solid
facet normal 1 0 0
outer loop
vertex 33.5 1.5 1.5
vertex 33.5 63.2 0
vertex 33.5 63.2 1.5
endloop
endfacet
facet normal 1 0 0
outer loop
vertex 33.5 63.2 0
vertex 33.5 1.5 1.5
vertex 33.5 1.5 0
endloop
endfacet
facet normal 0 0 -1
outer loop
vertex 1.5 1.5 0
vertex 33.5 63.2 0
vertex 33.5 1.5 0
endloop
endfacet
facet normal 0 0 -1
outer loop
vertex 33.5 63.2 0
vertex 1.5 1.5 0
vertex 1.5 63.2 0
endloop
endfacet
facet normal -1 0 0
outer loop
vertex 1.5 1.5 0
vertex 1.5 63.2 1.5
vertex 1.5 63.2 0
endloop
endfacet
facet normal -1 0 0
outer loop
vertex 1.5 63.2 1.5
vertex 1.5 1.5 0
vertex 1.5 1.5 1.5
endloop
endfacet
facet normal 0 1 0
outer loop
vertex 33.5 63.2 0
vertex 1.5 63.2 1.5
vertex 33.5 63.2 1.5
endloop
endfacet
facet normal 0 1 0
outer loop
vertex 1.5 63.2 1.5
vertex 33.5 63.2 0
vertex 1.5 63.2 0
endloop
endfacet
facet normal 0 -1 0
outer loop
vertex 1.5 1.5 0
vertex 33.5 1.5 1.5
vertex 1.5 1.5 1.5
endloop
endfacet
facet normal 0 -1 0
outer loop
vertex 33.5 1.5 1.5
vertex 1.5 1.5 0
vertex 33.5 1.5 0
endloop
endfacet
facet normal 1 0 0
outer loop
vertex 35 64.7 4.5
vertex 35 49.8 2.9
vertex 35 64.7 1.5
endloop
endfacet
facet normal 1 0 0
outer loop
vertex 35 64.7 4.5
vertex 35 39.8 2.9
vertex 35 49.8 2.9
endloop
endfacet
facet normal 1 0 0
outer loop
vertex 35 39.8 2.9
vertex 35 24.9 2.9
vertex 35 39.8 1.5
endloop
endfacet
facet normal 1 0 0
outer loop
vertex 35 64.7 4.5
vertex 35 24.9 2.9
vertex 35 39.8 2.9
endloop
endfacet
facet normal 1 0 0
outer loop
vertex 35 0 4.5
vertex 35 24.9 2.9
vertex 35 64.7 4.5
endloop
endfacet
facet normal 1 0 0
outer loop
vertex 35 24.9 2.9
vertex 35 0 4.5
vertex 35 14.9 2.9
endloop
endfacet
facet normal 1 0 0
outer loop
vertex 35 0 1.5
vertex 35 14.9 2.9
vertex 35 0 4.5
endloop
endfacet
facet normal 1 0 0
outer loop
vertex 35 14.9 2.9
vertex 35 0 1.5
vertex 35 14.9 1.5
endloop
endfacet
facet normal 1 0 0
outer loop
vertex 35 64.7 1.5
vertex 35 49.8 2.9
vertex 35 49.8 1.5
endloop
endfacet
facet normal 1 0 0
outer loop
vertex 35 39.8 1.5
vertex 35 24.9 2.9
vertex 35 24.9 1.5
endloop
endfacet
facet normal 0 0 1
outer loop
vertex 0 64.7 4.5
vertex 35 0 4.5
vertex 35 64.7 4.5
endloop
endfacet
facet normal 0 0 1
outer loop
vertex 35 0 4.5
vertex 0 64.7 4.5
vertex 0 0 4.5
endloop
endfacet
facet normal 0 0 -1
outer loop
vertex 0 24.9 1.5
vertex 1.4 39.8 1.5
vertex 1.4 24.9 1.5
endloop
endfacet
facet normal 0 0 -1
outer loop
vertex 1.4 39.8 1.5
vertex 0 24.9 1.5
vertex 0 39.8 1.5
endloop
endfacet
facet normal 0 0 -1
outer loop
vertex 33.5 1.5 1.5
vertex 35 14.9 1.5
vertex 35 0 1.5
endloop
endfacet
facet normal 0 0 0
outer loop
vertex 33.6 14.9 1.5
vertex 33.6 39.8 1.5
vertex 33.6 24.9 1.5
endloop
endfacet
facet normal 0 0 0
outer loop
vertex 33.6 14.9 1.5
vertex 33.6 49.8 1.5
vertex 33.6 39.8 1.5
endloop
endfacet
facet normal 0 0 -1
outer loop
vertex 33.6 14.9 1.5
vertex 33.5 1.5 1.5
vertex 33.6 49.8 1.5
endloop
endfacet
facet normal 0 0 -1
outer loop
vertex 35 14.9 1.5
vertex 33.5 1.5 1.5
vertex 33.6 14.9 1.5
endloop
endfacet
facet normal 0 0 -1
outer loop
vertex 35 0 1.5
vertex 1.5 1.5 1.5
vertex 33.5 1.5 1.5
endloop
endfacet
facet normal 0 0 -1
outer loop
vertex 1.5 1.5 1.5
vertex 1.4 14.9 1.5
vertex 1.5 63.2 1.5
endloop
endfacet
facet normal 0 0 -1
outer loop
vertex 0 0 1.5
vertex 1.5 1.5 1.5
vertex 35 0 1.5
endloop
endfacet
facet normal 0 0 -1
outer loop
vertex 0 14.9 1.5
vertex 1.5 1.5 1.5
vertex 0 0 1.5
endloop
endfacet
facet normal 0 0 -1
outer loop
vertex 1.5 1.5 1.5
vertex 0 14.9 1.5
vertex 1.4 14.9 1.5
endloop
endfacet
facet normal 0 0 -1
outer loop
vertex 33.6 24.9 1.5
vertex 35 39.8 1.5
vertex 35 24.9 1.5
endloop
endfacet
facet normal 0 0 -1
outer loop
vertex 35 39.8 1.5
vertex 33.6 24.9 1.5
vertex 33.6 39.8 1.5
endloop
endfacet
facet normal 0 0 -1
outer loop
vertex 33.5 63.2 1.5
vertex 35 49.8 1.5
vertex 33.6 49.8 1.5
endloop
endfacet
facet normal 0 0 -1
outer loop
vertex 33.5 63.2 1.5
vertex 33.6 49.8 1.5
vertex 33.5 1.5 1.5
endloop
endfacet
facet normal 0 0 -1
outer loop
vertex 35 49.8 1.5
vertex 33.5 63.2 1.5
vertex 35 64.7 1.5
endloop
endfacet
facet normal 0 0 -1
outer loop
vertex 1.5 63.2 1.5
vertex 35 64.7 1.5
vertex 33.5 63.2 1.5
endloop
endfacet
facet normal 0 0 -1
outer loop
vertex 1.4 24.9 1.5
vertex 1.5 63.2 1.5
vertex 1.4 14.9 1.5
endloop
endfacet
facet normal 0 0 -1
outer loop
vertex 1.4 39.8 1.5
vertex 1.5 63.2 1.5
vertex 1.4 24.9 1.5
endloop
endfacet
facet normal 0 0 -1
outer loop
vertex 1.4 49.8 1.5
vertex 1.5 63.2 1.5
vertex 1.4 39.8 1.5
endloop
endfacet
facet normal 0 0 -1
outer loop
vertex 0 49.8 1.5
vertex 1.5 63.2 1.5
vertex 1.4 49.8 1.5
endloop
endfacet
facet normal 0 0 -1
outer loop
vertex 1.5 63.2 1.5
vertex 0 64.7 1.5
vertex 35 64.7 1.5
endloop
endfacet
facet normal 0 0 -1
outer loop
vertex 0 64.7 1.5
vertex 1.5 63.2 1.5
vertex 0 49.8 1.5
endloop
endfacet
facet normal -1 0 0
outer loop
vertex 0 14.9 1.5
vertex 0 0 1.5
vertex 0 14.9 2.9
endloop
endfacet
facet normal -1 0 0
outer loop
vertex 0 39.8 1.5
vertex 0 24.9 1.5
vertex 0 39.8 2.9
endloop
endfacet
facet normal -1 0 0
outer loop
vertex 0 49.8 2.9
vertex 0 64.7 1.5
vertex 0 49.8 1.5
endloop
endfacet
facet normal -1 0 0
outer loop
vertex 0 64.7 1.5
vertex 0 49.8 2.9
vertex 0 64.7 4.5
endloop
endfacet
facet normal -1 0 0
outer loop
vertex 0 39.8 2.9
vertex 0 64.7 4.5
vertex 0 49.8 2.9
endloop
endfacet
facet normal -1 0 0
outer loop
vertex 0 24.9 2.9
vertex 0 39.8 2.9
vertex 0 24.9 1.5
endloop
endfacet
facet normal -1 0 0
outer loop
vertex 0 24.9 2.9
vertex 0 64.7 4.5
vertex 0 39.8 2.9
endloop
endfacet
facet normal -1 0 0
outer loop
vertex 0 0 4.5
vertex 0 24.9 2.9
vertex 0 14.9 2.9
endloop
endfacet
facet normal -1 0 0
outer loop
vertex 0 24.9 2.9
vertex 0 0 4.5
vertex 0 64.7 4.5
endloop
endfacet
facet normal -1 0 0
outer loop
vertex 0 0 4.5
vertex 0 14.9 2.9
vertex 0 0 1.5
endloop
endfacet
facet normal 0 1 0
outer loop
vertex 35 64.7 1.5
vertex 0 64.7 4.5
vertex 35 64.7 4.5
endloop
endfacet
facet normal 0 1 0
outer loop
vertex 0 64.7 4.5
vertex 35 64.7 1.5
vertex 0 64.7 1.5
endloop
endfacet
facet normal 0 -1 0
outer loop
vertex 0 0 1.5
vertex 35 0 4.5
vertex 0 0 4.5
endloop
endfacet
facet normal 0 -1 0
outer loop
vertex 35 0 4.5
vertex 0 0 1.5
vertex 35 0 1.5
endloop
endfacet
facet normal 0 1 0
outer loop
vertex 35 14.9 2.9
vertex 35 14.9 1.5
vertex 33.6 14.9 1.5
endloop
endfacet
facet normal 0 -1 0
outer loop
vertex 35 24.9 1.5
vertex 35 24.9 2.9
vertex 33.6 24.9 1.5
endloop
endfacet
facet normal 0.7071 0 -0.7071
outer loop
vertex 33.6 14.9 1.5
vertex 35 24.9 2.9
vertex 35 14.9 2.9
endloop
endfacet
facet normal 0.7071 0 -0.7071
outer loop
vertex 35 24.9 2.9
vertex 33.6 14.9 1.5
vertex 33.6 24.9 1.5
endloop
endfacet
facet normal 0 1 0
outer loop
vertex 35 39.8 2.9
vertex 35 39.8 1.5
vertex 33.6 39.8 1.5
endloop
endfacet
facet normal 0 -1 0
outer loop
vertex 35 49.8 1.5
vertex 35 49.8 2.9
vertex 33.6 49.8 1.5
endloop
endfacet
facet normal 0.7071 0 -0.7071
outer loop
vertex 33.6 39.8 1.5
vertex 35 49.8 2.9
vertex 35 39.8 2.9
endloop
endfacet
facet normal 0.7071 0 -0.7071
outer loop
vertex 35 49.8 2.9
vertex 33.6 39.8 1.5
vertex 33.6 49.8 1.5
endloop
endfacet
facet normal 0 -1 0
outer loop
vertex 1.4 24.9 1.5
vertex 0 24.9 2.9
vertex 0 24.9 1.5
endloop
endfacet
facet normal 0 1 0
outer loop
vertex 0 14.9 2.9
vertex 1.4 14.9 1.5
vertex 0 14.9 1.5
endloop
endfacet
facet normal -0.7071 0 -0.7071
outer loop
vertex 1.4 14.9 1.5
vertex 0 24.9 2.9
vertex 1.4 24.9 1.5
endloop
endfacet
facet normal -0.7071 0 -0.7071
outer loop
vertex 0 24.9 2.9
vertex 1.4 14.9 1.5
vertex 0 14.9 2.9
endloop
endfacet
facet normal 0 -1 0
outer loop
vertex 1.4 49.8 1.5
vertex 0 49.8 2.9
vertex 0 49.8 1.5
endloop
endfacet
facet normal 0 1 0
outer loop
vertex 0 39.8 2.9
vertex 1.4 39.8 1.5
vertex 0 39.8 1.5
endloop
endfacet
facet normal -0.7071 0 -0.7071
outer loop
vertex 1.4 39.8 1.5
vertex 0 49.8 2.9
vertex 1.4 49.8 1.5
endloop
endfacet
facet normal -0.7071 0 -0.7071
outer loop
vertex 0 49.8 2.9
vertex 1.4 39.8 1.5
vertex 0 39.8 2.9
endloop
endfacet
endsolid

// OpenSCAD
$fn = 30;

wall_thickness = 3;
cover_edge_thickness = wall_thickness / 2;
cover_edge_height = wall_thickness / 2;
cover_screw_cutout_length = 10;
cover_screw_cutout_radius = cover_edge_height + 10;
cover_screw_cutout_degrees = 45;

usb_plug_height = 6.5;
usb_plug_width = 12.0;
usb_plug_offset = 4.2;

pins_height = 8;
pin_wire_socket_height = 12.0;
pin_wire_extra = 0.5;
pin_base_height = 2.5;
nodemcu_board_thickness = 1.8;
nodemcu_chip_height = 5;
nodemcu_width = 20.8;
nodemcu_length = 43.2;

nut_size = 6.2;
nut_height = 2.3;
screw_support_hole = 2.6;
screw_support_size_bottom = nut_size + 2;
screw_support_size_top = screw_support_hole + 1;

interboard_distance = 2;

bme_length = 13.5;
bme_width = 10.6;
bme_height = 3.4;
bme_chips_height = 0.5;
bme_outside_offset = screw_support_size_bottom;
bme_screw_hole_offset = 2.6;

wall_height = wall_thickness + nodemcu_chip_height + nodemcu_board_thickness + pin_base_height + pin_wire_socket_height + pin_wire_extra + cover_edge_height;
platform_width = wall_thickness + screw_support_size_bottom + nodemcu_width + wall_thickness;
platform_depth = wall_thickness + screw_support_size_bottom + nodemcu_length + interboard_distance + bme_length - bme_outside_offset + wall_thickness;

module nut_trap (w = nut_size, h = nut_height) {
    cylinder(r = w / 2 / cos(180 / 6) + 0.05, h = h, center = false, $fn = 6);
}    

module wedge_180(h, r, d)
{
	rotate(d) difference()
	{
		rotate(180-d) difference()
		{
			cylinder(h = h, r = r);
			translate([-(r+1), 0, -1]) cube([r*2+2, r+1, h+2]);
		}
		translate([-(r+1), 0, -1]) cube([r*2+2, r+1, h+2]);
	}
}

module wedge(h, r, d)
{
	if(d <= 180)
		wedge_180(h, r, d);
	else
		rotate(d) difference()
		{
			cylinder(h = h, r = r);
			translate([0, 0, -1]) wedge_180(h+2, r+1, 360-d);
		}
}

// Height is from inner platform base
module screw_support (h = wall_height) {
    translate([0, 0, wall_thickness]) {
        cylinder(d1 = screw_support_size_bottom, d2 = screw_support_size_top, h = h, center = false);
    }
}

module screw_hole (h = wall_height) {
    translate([0, 0, -0.1]) {
        cylinder(d = screw_support_hole, h = h + 0.2, center = false);
        nut_trap();
    }
}

module nodemcu_supports() {
    screw_support(h = nodemcu_chip_height);
    translate([nodemcu_width, 0, 0]) screw_support(h = nodemcu_chip_height);
    translate([0, nodemcu_length, 0]) screw_support(h = nodemcu_chip_height);
    translate([nodemcu_width, nodemcu_length, 0]) screw_support(h = nodemcu_chip_height);
}

module nodemcu_holes() {
    screw_hole(h = nodemcu_chip_height + wall_thickness);
    translate([nodemcu_width, 0, 0]) screw_hole(h = nodemcu_chip_height + wall_thickness);
    translate([0, nodemcu_length, 0]) screw_hole(h = nodemcu_chip_height + wall_thickness);
    translate([nodemcu_width, nodemcu_length, 0]) screw_hole(h = nodemcu_chip_height + wall_thickness);
}

module case_frame() {
    union() {
        // Main platform
        cube(size = [platform_width, platform_depth, wall_thickness], center = false);
        // Front wall
        translate([0, 0, 0]) cube(size = [platform_width, wall_thickness, wall_height], center = false);
        // Back wall
        translate([0, platform_depth - wall_thickness, 0]) cube(size = [platform_width, wall_thickness, wall_height], center = false);
        // Left wall
        translate([0, 0, 0]) cube(size = [wall_thickness, platform_depth, wall_height], center = false);
        // Right wall
        translate([platform_width - wall_thickness, 0, 0]) cube(size = [wall_thickness, platform_depth, wall_height], center = false);
    }
}

module case() {
    union() {
        case_frame();
        translate([screw_support_size_bottom / 2 + wall_thickness, screw_support_size_bottom / 2 + wall_thickness, 0]) nodemcu_supports();
        // Platform for BME chip outside of main case
        translate([platform_width / 2 - bme_width / 2 - (screw_support_size_bottom / 2 - bme_screw_hole_offset), platform_depth - 0.1, 0]) cube(size = [bme_width + screw_support_size_bottom / 2 - bme_screw_hole_offset, bme_outside_offset + 0.1, wall_thickness]);
        translate([platform_width / 2 - bme_width / 2 + screw_support_size_bottom / 2, platform_depth + bme_outside_offset - screw_support_size_bottom / 2, 0]) screw_support(h = nodemcu_chip_height);
    }
}

module case_cover() {
    difference() {
        union() {
            translate([cover_edge_thickness, cover_edge_thickness, 0]) cube(size = [platform_width - cover_edge_thickness * 2, platform_depth - cover_edge_thickness * 2,cover_edge_height + 0.1], center = false);
            translate([0, 0, cover_edge_thickness]) cube(size = [platform_width, platform_depth, wall_thickness]);
        }
        translate([platform_width - cover_edge_thickness, (platform_depth - 2 * cover_screw_cutout_length) / 3 + cover_screw_cutout_length, cover_edge_thickness - 0.1]) rotate(a = [90, 0, 0]) {
            wedge(cover_screw_cutout_length, cover_screw_cutout_radius + 0.1, cover_screw_cutout_degrees);
        }
        translate([platform_width - cover_edge_thickness, (platform_depth - 2 * cover_screw_cutout_length) / 3 * 2 + cover_screw_cutout_length * 2, cover_edge_thickness - 0.1]) rotate(a = [90, 0, 0]) {
            wedge(cover_screw_cutout_length, cover_screw_cutout_radius + 0.1, cover_screw_cutout_degrees);
        }
        translate([cover_edge_thickness, (platform_depth - 2 * cover_screw_cutout_length) / 3, cover_edge_thickness - 0.1]) rotate(a = [270, 180, 0]) {
            wedge(cover_screw_cutout_length, cover_screw_cutout_radius + 0.1, cover_screw_cutout_degrees);
        }
        translate([cover_edge_thickness, (platform_depth - 2 * cover_screw_cutout_length) / 3 * 2 + cover_screw_cutout_length, cover_edge_thickness - 0.1]) rotate(a = [270, 180, 0]) {
            wedge(cover_screw_cutout_length, cover_screw_cutout_radius + 0.1, cover_screw_cutout_degrees);
        }
    }
}

/*
difference() {
    case();
    // Holes for NodeMCU
    translate([screw_support_size_bottom / 2 + wall_thickness, screw_support_size_bottom / 2 + wall_thickness, 0]) nodemcu_holes();
    translate([platform_width / 2 - bme_width / 2 + screw_support_size_bottom / 2, platform_depth + bme_outside_offset - screw_support_size_bottom / 2, 0]) screw_hole();
    // Remove cover from top
    translate([0, 0, wall_height - cover_edge_height]) case_cover();
    // Hole for USB socket
    translate([platform_width / 2 - usb_plug_width / 2, -0.1, wall_thickness + nodemcu_chip_height - usb_plug_offset]) cube(size = [usb_plug_width, wall_thickness + 0.2, usb_plug_height]);
    // Hole for BME chip
    translate([platform_width / 2 - bme_width / 2, platform_depth - wall_thickness - 0.1, wall_thickness + nodemcu_chip_height - bme_chips_height]) cube(size = [bme_width, wall_thickness + 0.2, bme_height]);
}
*/
case_cover();
